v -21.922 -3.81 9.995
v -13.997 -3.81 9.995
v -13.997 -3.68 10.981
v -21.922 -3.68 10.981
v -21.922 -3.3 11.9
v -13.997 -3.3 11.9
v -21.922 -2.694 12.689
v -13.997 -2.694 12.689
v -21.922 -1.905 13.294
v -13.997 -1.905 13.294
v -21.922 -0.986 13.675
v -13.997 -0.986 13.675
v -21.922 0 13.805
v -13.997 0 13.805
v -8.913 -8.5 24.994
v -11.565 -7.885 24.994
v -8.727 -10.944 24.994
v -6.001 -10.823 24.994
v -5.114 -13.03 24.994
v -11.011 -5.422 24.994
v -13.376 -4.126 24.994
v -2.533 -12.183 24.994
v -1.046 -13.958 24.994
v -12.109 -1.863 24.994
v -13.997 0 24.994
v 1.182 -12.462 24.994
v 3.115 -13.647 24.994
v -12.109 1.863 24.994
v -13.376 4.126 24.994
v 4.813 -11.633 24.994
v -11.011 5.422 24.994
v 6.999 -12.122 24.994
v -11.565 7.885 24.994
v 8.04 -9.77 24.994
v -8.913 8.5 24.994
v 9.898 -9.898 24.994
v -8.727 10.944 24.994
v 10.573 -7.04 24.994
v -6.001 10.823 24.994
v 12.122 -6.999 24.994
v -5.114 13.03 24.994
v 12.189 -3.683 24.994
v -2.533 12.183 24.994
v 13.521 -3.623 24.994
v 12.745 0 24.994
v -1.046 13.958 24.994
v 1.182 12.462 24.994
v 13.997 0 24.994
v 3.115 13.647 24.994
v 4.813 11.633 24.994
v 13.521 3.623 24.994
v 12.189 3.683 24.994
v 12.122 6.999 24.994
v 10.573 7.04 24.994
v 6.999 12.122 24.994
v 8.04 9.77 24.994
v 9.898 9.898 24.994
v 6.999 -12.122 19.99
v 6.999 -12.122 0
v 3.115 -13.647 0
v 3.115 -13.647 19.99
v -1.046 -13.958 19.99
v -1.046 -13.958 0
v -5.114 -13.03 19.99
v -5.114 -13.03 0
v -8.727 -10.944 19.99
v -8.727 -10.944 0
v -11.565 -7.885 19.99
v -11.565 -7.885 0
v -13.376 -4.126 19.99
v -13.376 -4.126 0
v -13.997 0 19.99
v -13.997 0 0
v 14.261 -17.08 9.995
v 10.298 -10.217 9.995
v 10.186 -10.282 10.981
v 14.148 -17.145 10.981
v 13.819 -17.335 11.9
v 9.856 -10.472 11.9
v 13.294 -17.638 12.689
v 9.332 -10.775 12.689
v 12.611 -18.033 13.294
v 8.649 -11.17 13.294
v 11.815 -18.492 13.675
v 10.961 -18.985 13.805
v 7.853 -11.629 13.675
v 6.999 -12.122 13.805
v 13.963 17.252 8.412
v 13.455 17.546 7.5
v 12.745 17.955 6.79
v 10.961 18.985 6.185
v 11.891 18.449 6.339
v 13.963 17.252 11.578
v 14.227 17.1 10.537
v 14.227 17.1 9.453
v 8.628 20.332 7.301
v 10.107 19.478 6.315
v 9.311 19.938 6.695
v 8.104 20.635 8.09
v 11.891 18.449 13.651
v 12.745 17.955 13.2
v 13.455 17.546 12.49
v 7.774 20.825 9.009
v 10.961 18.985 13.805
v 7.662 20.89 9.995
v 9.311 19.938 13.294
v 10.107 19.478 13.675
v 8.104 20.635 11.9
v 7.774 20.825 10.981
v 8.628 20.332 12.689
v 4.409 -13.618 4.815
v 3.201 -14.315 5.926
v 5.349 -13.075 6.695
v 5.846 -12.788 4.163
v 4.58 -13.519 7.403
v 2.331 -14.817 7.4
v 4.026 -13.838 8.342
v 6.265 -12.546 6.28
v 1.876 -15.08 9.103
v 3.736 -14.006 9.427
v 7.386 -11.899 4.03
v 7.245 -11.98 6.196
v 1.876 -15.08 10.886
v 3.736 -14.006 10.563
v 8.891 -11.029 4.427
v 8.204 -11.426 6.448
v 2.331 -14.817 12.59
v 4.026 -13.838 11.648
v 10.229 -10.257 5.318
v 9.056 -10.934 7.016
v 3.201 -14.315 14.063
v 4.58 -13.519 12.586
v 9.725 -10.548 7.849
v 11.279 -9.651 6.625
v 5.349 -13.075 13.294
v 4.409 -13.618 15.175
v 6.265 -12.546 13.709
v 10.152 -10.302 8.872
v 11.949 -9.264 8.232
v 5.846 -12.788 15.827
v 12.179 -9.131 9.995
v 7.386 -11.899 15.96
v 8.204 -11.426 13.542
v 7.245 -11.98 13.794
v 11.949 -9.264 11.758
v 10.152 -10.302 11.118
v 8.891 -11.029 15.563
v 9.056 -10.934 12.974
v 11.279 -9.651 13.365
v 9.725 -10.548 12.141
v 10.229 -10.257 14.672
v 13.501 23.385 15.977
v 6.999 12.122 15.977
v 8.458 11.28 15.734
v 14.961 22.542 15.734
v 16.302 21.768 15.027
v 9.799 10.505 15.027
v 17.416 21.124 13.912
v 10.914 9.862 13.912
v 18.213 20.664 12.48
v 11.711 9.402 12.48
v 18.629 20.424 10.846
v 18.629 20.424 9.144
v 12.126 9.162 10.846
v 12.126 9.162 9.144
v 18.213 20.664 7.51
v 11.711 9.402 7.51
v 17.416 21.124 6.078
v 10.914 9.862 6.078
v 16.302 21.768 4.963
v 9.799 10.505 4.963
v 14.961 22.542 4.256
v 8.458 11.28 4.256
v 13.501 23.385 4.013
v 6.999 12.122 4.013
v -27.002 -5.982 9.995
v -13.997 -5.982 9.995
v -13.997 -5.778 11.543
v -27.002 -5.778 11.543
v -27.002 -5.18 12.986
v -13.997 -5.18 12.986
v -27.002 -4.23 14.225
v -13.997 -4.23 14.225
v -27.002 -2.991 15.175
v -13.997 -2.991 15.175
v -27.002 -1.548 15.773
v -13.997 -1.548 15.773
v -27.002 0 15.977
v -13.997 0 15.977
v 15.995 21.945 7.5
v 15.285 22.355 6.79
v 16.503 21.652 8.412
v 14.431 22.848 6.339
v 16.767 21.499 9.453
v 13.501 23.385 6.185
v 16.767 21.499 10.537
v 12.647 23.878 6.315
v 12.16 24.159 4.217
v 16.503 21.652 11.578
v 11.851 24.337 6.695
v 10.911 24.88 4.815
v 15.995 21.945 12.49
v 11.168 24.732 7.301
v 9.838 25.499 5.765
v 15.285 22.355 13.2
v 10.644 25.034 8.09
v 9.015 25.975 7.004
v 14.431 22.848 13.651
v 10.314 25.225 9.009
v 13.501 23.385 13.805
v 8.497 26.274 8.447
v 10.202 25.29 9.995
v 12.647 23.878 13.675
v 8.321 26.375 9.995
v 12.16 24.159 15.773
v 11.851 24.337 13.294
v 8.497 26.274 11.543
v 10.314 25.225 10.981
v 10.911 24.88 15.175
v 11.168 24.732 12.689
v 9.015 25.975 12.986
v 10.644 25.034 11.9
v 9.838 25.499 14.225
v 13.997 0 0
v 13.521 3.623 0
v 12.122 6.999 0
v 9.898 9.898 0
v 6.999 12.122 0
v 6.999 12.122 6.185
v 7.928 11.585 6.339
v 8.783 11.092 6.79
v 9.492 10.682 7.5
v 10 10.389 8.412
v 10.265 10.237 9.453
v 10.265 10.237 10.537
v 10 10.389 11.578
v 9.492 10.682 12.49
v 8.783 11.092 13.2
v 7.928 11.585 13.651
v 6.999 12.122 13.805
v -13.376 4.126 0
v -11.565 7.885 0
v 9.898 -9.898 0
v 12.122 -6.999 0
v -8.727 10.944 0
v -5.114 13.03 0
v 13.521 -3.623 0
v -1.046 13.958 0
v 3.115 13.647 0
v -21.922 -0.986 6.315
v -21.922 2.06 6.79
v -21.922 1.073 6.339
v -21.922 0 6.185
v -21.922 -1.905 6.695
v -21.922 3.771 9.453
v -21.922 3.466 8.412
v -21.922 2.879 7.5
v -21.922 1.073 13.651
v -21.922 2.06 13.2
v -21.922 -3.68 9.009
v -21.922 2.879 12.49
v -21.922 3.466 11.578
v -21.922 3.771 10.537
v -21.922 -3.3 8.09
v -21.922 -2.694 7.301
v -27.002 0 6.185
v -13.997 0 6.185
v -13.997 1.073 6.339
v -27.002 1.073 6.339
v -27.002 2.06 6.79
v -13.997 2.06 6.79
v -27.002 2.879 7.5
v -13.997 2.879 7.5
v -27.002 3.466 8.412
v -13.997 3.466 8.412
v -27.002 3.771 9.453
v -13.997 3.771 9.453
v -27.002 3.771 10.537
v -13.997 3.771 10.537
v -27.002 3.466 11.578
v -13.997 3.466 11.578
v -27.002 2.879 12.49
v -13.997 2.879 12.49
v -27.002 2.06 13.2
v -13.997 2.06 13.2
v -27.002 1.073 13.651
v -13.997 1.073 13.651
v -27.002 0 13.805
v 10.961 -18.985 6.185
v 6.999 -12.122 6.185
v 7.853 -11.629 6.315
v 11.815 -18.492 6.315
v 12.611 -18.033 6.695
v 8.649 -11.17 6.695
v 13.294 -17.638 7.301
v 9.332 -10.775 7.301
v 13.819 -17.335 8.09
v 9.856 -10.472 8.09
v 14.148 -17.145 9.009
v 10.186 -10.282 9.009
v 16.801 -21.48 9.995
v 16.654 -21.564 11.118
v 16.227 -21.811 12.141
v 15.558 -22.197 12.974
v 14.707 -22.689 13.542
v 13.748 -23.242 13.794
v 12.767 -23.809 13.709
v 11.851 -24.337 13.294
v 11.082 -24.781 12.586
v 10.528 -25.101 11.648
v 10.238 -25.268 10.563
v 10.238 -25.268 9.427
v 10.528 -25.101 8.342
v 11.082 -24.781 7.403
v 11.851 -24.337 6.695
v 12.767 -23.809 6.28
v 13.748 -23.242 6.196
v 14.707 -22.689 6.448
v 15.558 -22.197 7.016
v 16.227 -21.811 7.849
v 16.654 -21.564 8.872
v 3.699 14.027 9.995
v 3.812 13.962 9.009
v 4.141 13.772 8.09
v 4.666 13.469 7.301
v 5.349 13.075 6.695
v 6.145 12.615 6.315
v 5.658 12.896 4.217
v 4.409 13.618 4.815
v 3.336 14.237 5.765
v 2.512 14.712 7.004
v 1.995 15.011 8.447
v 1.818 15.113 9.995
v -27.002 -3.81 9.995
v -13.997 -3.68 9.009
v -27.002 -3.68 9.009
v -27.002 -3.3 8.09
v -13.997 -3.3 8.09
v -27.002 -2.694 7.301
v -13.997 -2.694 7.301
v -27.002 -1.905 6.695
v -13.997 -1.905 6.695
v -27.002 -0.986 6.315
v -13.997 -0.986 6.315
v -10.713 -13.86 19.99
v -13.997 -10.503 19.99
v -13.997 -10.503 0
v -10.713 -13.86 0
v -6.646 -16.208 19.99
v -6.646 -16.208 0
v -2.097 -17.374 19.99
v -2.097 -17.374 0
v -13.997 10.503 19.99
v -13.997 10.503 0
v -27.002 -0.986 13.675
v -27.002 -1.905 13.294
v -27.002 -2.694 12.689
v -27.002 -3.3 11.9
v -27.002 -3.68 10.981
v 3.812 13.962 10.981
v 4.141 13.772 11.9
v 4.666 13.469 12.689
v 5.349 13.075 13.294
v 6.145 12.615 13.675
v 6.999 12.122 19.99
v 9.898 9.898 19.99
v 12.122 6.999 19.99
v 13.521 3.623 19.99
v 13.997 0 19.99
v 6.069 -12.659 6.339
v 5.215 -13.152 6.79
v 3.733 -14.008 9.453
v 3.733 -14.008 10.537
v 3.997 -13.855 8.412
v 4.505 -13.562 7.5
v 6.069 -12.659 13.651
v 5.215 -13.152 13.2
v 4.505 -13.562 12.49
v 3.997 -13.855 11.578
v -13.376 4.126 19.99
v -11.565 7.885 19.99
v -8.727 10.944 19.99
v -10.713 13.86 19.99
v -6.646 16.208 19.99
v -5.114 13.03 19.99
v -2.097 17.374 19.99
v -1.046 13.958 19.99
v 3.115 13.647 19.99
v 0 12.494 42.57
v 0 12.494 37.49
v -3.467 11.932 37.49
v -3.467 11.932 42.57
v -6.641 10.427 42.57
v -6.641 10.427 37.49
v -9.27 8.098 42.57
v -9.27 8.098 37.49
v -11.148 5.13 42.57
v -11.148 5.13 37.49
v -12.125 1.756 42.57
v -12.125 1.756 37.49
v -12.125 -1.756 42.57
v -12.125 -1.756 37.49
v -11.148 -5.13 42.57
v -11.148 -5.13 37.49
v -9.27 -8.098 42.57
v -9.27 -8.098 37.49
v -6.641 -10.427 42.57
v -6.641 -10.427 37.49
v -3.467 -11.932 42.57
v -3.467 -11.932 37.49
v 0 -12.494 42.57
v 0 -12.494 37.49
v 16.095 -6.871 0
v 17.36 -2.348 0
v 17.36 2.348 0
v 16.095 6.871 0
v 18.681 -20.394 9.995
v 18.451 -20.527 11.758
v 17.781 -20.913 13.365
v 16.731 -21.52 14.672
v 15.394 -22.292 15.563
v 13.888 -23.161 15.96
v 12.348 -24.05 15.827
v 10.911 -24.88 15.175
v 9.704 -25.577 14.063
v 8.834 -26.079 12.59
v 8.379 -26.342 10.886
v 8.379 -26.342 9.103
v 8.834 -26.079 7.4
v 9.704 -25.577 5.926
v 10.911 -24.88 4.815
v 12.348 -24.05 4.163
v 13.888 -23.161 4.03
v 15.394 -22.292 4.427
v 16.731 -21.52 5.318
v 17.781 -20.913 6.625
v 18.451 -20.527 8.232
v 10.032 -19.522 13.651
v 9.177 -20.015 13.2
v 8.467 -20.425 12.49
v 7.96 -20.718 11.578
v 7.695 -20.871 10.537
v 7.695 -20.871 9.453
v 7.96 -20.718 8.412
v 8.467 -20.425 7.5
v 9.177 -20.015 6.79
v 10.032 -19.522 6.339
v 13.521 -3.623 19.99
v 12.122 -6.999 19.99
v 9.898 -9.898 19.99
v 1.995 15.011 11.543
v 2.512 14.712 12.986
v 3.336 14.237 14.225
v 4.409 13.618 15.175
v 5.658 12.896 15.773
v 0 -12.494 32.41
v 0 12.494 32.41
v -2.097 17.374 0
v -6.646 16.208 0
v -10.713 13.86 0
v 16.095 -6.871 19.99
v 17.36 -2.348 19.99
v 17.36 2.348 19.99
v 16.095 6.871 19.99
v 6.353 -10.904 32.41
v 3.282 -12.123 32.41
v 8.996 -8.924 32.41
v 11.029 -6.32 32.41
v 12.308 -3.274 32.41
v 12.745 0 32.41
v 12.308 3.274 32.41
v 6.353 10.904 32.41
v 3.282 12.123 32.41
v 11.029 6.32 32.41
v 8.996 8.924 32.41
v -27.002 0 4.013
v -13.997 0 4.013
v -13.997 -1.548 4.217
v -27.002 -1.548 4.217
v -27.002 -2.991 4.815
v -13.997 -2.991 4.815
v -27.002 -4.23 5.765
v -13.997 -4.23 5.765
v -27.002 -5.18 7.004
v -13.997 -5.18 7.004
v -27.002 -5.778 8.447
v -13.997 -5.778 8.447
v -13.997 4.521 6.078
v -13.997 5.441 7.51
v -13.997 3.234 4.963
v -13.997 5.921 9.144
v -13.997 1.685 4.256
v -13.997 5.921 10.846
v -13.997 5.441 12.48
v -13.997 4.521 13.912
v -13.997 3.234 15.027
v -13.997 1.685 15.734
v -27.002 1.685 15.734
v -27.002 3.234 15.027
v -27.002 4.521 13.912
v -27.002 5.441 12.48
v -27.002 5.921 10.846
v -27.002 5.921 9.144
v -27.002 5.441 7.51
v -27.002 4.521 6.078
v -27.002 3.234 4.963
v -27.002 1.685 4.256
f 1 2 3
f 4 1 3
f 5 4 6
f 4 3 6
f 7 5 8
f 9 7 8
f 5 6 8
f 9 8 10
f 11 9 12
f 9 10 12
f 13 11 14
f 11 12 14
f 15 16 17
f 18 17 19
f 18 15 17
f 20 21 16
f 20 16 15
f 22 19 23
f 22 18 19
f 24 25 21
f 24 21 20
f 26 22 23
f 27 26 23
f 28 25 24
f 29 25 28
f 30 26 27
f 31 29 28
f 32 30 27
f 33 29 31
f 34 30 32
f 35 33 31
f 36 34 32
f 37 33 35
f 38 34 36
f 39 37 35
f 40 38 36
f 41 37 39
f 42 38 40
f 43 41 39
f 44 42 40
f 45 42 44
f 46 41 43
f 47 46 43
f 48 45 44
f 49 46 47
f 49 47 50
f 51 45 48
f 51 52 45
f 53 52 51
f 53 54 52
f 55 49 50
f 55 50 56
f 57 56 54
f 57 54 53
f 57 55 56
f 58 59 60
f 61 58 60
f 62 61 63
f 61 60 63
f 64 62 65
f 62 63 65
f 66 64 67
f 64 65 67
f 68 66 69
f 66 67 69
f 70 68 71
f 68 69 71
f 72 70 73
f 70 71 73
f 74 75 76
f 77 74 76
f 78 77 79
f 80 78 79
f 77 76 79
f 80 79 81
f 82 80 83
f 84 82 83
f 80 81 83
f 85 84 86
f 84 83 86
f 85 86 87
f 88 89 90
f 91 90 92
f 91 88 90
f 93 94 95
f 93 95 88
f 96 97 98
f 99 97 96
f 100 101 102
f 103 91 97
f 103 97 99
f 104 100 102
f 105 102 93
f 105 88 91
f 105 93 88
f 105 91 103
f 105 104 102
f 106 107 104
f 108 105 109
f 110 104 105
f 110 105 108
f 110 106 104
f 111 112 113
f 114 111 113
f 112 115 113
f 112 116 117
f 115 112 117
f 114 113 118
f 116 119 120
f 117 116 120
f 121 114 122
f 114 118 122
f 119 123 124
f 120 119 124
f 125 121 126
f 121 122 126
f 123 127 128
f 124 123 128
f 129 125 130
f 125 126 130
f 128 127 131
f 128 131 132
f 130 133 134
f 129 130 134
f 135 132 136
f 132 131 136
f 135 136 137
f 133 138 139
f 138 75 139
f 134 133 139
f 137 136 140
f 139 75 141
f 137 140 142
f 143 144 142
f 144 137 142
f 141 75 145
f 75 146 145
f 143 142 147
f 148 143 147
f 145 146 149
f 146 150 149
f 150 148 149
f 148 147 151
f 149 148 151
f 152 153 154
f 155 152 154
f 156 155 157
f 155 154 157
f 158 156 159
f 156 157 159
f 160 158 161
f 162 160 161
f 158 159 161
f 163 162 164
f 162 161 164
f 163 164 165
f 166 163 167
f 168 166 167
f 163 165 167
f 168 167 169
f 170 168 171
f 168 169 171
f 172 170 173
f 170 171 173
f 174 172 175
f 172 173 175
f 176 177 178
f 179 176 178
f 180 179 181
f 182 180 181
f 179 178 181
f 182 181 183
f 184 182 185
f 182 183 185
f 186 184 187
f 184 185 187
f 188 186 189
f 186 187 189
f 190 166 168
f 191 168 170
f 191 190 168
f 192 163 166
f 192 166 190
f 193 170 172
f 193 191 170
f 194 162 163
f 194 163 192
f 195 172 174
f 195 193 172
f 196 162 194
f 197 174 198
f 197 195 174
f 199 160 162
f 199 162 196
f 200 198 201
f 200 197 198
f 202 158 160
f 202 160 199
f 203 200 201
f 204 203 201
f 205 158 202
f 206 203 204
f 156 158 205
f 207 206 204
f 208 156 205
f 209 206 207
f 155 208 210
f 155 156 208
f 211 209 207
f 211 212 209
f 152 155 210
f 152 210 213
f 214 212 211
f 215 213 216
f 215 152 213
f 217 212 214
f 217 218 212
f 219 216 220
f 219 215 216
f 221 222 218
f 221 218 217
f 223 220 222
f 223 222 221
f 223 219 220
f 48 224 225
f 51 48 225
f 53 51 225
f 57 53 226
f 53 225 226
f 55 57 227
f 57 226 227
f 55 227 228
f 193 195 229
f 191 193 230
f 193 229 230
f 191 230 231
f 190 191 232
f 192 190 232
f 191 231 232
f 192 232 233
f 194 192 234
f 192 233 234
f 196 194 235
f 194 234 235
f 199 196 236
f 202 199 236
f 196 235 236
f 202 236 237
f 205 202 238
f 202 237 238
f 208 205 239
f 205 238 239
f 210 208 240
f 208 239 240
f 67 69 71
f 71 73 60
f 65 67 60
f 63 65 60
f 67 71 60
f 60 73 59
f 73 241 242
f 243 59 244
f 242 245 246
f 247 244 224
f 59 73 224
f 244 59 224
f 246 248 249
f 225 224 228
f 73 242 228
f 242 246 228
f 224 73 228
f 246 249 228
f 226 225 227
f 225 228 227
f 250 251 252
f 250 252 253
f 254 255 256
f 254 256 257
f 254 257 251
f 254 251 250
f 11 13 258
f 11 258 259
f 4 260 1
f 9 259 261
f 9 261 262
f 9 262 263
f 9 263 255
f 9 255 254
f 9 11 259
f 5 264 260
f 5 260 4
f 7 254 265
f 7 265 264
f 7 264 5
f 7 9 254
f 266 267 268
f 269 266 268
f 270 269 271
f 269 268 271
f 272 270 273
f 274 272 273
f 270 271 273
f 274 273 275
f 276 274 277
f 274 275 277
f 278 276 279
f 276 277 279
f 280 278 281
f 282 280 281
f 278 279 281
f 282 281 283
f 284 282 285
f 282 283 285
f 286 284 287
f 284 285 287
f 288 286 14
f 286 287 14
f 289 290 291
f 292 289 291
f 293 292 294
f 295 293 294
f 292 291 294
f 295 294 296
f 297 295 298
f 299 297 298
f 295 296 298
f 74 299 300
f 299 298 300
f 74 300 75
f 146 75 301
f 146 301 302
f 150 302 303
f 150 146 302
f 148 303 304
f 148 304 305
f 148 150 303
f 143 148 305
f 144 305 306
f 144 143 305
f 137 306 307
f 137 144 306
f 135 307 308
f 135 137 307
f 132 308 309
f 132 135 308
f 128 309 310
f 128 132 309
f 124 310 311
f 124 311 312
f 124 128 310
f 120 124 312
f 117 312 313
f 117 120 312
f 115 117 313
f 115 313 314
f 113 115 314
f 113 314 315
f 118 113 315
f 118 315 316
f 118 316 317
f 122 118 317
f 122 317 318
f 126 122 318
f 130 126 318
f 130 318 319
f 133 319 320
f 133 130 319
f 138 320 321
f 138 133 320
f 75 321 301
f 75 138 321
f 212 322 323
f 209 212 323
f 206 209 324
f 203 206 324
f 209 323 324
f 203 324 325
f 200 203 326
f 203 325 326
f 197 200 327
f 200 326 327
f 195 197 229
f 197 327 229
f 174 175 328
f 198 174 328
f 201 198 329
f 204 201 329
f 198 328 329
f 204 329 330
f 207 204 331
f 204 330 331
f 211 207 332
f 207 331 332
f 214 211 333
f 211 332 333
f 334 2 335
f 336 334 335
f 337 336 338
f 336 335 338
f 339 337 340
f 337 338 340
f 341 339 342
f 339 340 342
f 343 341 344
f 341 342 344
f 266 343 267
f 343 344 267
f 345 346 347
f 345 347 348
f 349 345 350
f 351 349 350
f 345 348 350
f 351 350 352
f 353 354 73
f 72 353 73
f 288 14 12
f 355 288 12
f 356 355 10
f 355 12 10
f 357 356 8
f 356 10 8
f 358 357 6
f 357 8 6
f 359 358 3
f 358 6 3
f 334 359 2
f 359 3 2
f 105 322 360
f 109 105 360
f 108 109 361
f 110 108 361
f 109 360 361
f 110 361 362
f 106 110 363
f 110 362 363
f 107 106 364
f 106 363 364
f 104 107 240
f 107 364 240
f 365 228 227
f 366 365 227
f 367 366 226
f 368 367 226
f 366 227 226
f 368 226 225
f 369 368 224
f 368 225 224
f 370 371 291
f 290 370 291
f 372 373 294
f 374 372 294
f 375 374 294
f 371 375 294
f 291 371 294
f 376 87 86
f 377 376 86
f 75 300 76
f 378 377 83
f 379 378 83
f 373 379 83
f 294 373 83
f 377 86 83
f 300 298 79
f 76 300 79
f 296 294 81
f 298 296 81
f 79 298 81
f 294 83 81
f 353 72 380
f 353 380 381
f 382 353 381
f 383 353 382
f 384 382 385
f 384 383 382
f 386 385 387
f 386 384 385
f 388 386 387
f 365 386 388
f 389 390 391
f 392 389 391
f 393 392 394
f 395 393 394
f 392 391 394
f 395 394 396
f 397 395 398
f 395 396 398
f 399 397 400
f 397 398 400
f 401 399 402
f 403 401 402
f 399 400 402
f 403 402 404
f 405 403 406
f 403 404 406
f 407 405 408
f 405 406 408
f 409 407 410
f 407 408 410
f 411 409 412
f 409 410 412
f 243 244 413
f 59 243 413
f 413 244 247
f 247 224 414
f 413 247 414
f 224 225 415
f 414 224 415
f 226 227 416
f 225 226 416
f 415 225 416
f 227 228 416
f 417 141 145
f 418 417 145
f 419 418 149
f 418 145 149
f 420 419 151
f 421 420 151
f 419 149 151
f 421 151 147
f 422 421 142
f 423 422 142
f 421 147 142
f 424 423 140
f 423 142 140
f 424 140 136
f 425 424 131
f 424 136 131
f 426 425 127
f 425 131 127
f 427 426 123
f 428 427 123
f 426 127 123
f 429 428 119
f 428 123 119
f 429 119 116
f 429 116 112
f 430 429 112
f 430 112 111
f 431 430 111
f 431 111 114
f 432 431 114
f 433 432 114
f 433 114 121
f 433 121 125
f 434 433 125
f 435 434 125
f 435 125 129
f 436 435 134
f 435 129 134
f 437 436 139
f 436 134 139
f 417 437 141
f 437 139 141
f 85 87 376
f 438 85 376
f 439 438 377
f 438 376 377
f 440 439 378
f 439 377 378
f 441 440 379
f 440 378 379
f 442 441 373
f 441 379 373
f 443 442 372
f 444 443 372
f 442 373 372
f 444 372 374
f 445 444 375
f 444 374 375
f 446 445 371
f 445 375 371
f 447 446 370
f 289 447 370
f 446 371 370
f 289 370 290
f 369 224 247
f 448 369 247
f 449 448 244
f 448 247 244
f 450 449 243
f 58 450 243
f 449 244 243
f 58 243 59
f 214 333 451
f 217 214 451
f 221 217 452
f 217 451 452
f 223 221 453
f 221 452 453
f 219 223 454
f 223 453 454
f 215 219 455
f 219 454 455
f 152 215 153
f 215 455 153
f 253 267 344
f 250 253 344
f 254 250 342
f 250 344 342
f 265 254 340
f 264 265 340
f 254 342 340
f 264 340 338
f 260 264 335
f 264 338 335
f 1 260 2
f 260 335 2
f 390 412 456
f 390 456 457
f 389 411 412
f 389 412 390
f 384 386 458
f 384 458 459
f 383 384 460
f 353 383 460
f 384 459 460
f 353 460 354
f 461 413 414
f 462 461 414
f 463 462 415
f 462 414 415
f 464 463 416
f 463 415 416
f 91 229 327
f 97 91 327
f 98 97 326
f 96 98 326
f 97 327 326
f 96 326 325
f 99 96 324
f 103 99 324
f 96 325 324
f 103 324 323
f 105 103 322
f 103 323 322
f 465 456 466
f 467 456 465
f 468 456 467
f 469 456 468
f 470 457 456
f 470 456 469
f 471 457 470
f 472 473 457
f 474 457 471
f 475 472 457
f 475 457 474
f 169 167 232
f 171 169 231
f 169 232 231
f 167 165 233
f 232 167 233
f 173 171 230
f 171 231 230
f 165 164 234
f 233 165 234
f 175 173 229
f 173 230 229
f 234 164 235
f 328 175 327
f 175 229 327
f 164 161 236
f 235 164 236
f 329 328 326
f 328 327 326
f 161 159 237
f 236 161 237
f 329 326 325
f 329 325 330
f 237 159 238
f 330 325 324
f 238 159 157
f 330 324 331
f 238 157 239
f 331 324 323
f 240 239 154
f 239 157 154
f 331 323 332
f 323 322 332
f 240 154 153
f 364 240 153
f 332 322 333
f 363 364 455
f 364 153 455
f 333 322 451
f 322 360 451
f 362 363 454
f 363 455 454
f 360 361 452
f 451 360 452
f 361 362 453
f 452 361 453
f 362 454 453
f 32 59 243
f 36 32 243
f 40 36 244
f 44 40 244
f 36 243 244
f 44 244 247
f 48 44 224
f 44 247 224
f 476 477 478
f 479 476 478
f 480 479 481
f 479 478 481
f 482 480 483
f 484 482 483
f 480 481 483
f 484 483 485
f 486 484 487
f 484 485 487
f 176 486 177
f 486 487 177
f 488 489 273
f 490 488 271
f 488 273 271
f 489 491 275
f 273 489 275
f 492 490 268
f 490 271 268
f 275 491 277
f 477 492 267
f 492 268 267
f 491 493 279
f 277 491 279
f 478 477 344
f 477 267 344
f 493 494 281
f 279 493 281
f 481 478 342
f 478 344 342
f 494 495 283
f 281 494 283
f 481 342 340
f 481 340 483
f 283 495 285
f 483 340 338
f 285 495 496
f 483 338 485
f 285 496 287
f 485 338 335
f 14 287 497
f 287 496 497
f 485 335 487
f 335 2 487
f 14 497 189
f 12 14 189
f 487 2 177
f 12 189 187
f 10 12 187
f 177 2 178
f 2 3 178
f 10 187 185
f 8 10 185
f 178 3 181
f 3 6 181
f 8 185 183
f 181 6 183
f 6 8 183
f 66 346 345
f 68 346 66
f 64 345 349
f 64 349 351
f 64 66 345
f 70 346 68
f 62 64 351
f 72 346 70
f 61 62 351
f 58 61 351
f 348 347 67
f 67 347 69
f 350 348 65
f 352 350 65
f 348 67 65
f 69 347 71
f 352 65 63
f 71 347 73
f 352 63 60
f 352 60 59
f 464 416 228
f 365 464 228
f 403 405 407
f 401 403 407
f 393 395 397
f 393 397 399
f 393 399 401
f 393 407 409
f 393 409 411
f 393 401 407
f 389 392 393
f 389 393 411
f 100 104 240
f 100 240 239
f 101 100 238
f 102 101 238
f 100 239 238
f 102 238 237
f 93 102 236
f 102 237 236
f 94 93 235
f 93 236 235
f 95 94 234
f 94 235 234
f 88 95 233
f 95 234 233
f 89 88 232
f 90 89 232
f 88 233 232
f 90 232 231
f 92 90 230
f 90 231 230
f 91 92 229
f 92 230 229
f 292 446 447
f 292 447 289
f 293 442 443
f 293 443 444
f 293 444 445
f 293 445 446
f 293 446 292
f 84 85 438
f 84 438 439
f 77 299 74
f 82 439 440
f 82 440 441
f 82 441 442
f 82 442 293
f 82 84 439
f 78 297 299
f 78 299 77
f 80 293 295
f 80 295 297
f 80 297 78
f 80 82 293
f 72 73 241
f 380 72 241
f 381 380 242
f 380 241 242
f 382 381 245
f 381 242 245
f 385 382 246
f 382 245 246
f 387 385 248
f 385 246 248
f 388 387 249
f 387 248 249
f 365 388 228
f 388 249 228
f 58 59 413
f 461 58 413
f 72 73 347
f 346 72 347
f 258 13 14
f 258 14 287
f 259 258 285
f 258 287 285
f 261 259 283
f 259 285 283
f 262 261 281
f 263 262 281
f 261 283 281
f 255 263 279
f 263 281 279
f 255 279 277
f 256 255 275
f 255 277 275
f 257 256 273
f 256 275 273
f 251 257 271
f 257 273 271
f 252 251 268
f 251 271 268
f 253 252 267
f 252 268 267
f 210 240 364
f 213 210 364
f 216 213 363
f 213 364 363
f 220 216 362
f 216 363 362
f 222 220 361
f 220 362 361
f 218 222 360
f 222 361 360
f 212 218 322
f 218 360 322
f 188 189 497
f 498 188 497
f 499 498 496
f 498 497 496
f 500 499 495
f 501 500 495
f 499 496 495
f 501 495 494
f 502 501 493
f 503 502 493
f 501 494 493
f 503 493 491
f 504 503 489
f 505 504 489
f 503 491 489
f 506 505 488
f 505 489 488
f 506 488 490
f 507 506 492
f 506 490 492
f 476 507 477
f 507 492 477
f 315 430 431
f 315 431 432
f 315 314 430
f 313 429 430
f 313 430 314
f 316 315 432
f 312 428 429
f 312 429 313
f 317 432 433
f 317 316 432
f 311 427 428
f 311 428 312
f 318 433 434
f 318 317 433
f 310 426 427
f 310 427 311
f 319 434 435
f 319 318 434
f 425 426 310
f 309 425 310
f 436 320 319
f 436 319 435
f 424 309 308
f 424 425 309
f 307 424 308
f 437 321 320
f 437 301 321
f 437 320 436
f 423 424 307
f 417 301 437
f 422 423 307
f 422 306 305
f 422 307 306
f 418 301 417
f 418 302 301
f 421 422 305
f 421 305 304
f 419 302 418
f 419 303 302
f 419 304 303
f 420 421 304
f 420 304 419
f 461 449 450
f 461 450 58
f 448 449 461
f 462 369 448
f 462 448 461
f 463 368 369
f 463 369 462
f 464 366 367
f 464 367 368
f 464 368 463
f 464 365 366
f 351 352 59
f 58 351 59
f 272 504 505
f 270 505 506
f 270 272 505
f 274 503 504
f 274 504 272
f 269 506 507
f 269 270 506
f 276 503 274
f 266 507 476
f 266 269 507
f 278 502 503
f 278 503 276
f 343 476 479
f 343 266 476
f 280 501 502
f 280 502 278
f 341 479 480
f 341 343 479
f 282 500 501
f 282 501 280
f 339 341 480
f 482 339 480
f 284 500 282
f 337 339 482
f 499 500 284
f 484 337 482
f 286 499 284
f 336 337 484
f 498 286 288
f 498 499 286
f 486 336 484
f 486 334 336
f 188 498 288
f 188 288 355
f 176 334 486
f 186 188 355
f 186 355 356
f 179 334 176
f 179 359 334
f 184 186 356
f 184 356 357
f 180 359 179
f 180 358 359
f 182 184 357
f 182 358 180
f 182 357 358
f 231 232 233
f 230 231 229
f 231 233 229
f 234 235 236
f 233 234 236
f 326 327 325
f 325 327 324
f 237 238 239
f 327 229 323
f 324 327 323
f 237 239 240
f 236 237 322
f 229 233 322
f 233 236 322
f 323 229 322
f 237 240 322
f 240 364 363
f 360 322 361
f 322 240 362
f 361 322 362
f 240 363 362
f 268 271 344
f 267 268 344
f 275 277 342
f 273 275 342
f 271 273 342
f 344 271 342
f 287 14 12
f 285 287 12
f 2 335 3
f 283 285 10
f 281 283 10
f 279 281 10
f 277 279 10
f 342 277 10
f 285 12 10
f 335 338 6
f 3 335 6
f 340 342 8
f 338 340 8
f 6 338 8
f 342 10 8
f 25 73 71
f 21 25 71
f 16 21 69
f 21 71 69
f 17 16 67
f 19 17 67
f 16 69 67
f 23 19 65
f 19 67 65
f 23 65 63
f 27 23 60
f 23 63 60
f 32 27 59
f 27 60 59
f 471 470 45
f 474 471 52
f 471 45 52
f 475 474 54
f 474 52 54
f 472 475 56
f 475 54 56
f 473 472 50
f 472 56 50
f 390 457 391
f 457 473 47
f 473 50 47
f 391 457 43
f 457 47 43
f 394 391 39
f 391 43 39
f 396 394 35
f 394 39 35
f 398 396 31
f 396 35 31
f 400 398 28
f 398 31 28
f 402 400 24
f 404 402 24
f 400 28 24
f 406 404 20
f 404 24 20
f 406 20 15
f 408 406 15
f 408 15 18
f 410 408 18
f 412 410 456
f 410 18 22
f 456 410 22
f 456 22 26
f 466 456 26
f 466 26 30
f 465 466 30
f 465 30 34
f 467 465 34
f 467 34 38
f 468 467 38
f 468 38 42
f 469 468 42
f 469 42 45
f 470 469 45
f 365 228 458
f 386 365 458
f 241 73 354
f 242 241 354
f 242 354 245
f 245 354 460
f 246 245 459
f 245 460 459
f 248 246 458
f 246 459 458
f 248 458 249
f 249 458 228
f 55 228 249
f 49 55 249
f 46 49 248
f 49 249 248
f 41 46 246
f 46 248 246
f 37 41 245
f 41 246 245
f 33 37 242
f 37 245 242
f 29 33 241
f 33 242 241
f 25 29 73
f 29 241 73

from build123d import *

# Parameters (mm, degrees)
F1_DEPTH  = 19.9898
F0_R      = 12.4968
F2_DEPTH  = 24.9936
F3_DEPTH  = 37.4904
F5_DEPTH  = 13.0048
F6_R      = 5.9817
F6_R_2    = 3.81
F7_DEPTH  = 13.0048
F8_DEPTH  = 7.9248
F9_DEPTH  = 7.9248
F11_DEPTH = 13.0048
F12_DEPTH = 7.9248
F14_DEPTH = 5.08
F15_DEPTH = 5.08


with BuildPart() as f1:
    # F0 (on Top) → F1 (new body)
    with BuildSketch(Plane.XY):
        with BuildLine():
            Line((-13.9974531313, 2.8e-09), (-13.9974531313, -10.5029))
            Line((-13.9974531313, -10.5029), (-2.0970516478, -17.3736))
            Line((-2.0970516478, -17.3736), (6.9987264714, -12.1221500544))
            ThreePointArc((6.9987264714, -12.1221500544), (-6.998726614, -12.1221499721), (-13.9974531313, 2.8e-09))
        make_face()
        with BuildLine():
            Line((-2.0970516478, -17.3736), (-13.9974531313, -10.5029))
            ThreePointArc((-13.9974531313, -10.5029), (-8.7599408106, -15.1726625552), (-2.0970516478, -17.3736))
        make_face()
    extrude(amount=F1_DEPTH)


with BuildPart() as f1b:
    # F0 (on Top) → F1, piece 2 (new body)
    with BuildSketch(Plane.XY):
        with BuildLine():
            ThreePointArc((-2.0970516478, 17.3736), (-8.7599408106, 15.1726625552), (-13.9974531313, 10.5029))
            Line((-13.9974531313, 10.5029), (-2.0970516478, 17.3736))
        make_face()
        with BuildLine():
            Line((-13.9974531313, 10.5029), (-13.9974531313, 2.8e-09))
            ThreePointArc((-13.9974531313, 2.8e-09), (-6.9987265569, 12.1221500051), (6.9987265808, 12.1221499913))
            Line((6.9987265808, 12.1221499913), (-2.0970516478, 17.3736))
            Line((-2.0970516478, 17.3736), (-13.9974531313, 10.5029))
        make_face()
    extrude(amount=F1_DEPTH)


with BuildPart() as f1c:
    # F0 (on Top) → F1, piece 3 (new body)
    with BuildSketch(Plane.XY):
        with BuildLine():
            Line((16.0945047791, 6.8707), (6.9987265808, 12.1221499913))
            ThreePointArc((6.9987265808, 12.1221499913), (12.1221500044, 6.9987265581), (13.9974531313, 0))
            ThreePointArc((13.9974531313, 0), (12.1221499728, -6.9987266128), (6.9987264714, -12.1221500544))
            Line((6.9987264714, -12.1221500544), (16.0945047791, -6.8707))
            Line((16.0945047791, -6.8707), (16.0945047791, 6.8707))
        make_face()
        with BuildLine():
            ThreePointArc((16.0945047791, -6.8707), (17.5198816211, 0), (16.0945047791, 6.8707))
            Line((16.0945047791, 6.8707), (16.0945047791, -6.8707))
        make_face()
    extrude(amount=F1_DEPTH)


with BuildPart() as f2:
    # F0 (on Top) → F2 (new body)
    with BuildSketch(Plane.XY):
        with BuildLine():
            ThreePointArc((6.9987265808, 12.1221499913), (-6.9987265569, 12.1221500051), (-13.9974531313, 2.8e-09))
            ThreePointArc((-13.9974531313, 2.8e-09), (-6.998726614, -12.1221499721), (6.9987264714, -12.1221500544))
            ThreePointArc((6.9987264714, -12.1221500544), (12.1221499728, -6.9987266128), (13.9974531313, 0))
            ThreePointArc((13.9974531313, 0), (12.1221500044, 6.9987265581), (6.9987265808, 12.1221499913))
        make_face()
        with Locations((0.2478816211, 0)):
            Circle(F0_R, mode=Mode.SUBTRACT)
    extrude(amount=F2_DEPTH)

    # F0 (on Top) → F3 (join)
    with BuildSketch(Plane.XY):
        with Locations((0.2478816211, 0)):
            Circle(F0_R)
    extrude(amount=F3_DEPTH)

    # F13 (on face) → F14 (join)
    with BuildSketch(Plane.XY.offset(37.4904)):
        with BuildLine():
            ThreePointArc((0, 12.4943413168), (-12.2489183789, 0), (0, -12.4943413168))
            Line((0, -12.4943413168), (0, 12.4943413168))
        make_face()
    extrude(amount=F14_DEPTH)

    # F15 (cut): a face of the model
    f15_faces = [f2.faces().sort_by_distance(p)[0] for p in [
        (5.4179933027, 0, 37.4904),
    ]]
    extrude(f15_faces, amount=-F15_DEPTH, mode=Mode.SUBTRACT)


with BuildPart() as f5:
    # F4 (on face) → F5 (new body)
    with BuildSketch(Plane(origin=(-13.9974531313, 0, 0), x_dir=(0, -1, 0), z_dir=(-1, 0, 0))):
        with BuildLine():
            Line((-2.8e-09, 13.8049), (-2.8e-09, 15.9766))
            ThreePointArc((-2.8e-09, 15.9766), (-5.9817, 9.9949), (-2.8e-09, 4.0132))
            Line((-2.8e-09, 4.0132), (-2.8e-09, 6.1849))
            ThreePointArc((-2.8e-09, 6.1849), (-3.81, 9.9949), (-2.8e-09, 13.8049))
        make_face()
        with BuildLine():
            ThreePointArc((-2.8e-09, 4.0132), (4.229700632, 5.765199366), (5.9817, 9.9949))
            ThreePointArc((5.9817, 9.9949), (4.229700632, 14.224600634), (-2.8e-09, 15.9766))
            Line((-2.8e-09, 15.9766), (-2.8e-09, 13.8049))
            ThreePointArc((-2.8e-09, 13.8049), (2.6940768353, 12.6889768373), (3.81, 9.9949))
            ThreePointArc((3.81, 9.9949), (2.6940768353, 7.3008231627), (-2.8e-09, 6.1849))
            Line((-2.8e-09, 6.1849), (-2.8e-09, 4.0132))
        make_face()
    extrude(amount=F5_DEPTH)


with BuildPart() as f7:
    # F6 (on face) → F7 (new body)
    with BuildSketch(Plane(origin=(6.9987265657, -12.12215, 0), x_dir=(0.8660254038, 0.5, 0), z_dir=(0.5, -0.8660254038, 0))):
        with Locations((0, 9.9949)):
            Circle(F6_R)
        with Locations((0, 9.9949)):
            Circle(F6_R_2, mode=Mode.SUBTRACT)
    extrude(amount=F7_DEPTH)


with BuildPart() as f8:
    # F4 (on face) → F8 (new body)
    with BuildSketch(Plane(origin=(-13.9974531313, 0, 0), x_dir=(0, -1, 0), z_dir=(-1, 0, 0))):
        with BuildLine():
            ThreePointArc((3.81, 9.9949), (2.6940768353, 12.6889768373), (-2.8e-09, 13.8049))
            Line((-2.8e-09, 13.8049), (-2.8e-09, 6.1849))
            ThreePointArc((-2.8e-09, 6.1849), (2.6940768353, 7.3008231627), (3.81, 9.9949))
        make_face()
        with BuildLine():
            Line((-2.8e-09, 6.1849), (-2.8e-09, 13.8049))
            ThreePointArc((-2.8e-09, 13.8049), (-3.81, 9.9949), (-2.8e-09, 6.1849))
        make_face()
    extrude(amount=F8_DEPTH)


with BuildPart() as f9:
    # F6 (on face) → F9 (new body)
    with BuildSketch(Plane(origin=(6.9987265657, -12.12215, 0), x_dir=(0.8660254038, 0.5, 0), z_dir=(0.5, -0.8660254038, 0))):
        with BuildLine():
            ThreePointArc((3.81, 9.9949), (2.6940767978, 12.6889768748), (-1.088e-07, 13.8049))
            Line((-1.088e-07, 13.8049), (-1.088e-07, 6.1849))
            ThreePointArc((-1.088e-07, 6.1849), (2.6940767978, 7.3008231252), (3.81, 9.9949))
        make_face()
        with BuildLine():
            Line((-1.088e-07, 6.1849), (-1.088e-07, 13.8049))
            ThreePointArc((-1.088e-07, 13.8049), (-3.81, 9.9949), (-1.088e-07, 6.1849))
        make_face()
    extrude(amount=F9_DEPTH)


with BuildPart() as f11:
    # F10 (on face) → F11 (new body)
    with BuildSketch(Plane(origin=(6.9987265657, 12.12215, 0), x_dir=(-0.8660254038, 0.5, 0), z_dir=(0.5, 0.8660254038, 0))):
        with BuildLine():
            ThreePointArc((-1.74e-08, 4.0132), (4.2297006269, 5.7651993608), (5.9817, 9.9949))
            ThreePointArc((5.9817, 9.9949), (4.2297006269, 14.2246006392), (-1.74e-08, 15.9766))
            Line((-1.74e-08, 15.9766), (-1.74e-08, 13.8049))
            ThreePointArc((-1.74e-08, 13.8049), (2.6940768302, 12.6889768425), (3.81, 9.9949))
            ThreePointArc((3.81, 9.9949), (2.6940768302, 7.3008231575), (-1.74e-08, 6.1849))
            Line((-1.74e-08, 6.1849), (-1.74e-08, 4.0132))
        make_face()
        with BuildLine():
            Line((-1.74e-08, 13.8049), (-1.74e-08, 15.9766))
            ThreePointArc((-1.74e-08, 15.9766), (-5.9817, 9.9949), (-1.74e-08, 4.0132))
            Line((-1.74e-08, 4.0132), (-1.74e-08, 6.1849))
            ThreePointArc((-1.74e-08, 6.1849), (-3.81, 9.9949), (-1.74e-08, 13.8049))
        make_face()
    extrude(amount=F11_DEPTH)


with BuildPart() as f12:
    # F10 (on face) → F12 (new body)
    with BuildSketch(Plane(origin=(6.9987265657, 12.12215, 0), x_dir=(-0.8660254038, 0.5, 0), z_dir=(0.5, 0.8660254038, 0))):
        with BuildLine():
            Line((-1.74e-08, 6.1849), (-1.74e-08, 13.8049))
            ThreePointArc((-1.74e-08, 13.8049), (-3.81, 9.9949), (-1.74e-08, 6.1849))
        make_face()
        with BuildLine():
            ThreePointArc((3.81, 9.9949), (2.6940768302, 12.6889768425), (-1.74e-08, 13.8049))
            Line((-1.74e-08, 13.8049), (-1.74e-08, 6.1849))
            ThreePointArc((-1.74e-08, 6.1849), (2.6940768302, 7.3008231575), (3.81, 9.9949))
        make_face()
    extrude(amount=F12_DEPTH)


solid = Compound([f1.part, f1b.part, f1c.part, f2.part, f5.part, f7.part, f8.part, f9.part, f11.part, f12.part])
